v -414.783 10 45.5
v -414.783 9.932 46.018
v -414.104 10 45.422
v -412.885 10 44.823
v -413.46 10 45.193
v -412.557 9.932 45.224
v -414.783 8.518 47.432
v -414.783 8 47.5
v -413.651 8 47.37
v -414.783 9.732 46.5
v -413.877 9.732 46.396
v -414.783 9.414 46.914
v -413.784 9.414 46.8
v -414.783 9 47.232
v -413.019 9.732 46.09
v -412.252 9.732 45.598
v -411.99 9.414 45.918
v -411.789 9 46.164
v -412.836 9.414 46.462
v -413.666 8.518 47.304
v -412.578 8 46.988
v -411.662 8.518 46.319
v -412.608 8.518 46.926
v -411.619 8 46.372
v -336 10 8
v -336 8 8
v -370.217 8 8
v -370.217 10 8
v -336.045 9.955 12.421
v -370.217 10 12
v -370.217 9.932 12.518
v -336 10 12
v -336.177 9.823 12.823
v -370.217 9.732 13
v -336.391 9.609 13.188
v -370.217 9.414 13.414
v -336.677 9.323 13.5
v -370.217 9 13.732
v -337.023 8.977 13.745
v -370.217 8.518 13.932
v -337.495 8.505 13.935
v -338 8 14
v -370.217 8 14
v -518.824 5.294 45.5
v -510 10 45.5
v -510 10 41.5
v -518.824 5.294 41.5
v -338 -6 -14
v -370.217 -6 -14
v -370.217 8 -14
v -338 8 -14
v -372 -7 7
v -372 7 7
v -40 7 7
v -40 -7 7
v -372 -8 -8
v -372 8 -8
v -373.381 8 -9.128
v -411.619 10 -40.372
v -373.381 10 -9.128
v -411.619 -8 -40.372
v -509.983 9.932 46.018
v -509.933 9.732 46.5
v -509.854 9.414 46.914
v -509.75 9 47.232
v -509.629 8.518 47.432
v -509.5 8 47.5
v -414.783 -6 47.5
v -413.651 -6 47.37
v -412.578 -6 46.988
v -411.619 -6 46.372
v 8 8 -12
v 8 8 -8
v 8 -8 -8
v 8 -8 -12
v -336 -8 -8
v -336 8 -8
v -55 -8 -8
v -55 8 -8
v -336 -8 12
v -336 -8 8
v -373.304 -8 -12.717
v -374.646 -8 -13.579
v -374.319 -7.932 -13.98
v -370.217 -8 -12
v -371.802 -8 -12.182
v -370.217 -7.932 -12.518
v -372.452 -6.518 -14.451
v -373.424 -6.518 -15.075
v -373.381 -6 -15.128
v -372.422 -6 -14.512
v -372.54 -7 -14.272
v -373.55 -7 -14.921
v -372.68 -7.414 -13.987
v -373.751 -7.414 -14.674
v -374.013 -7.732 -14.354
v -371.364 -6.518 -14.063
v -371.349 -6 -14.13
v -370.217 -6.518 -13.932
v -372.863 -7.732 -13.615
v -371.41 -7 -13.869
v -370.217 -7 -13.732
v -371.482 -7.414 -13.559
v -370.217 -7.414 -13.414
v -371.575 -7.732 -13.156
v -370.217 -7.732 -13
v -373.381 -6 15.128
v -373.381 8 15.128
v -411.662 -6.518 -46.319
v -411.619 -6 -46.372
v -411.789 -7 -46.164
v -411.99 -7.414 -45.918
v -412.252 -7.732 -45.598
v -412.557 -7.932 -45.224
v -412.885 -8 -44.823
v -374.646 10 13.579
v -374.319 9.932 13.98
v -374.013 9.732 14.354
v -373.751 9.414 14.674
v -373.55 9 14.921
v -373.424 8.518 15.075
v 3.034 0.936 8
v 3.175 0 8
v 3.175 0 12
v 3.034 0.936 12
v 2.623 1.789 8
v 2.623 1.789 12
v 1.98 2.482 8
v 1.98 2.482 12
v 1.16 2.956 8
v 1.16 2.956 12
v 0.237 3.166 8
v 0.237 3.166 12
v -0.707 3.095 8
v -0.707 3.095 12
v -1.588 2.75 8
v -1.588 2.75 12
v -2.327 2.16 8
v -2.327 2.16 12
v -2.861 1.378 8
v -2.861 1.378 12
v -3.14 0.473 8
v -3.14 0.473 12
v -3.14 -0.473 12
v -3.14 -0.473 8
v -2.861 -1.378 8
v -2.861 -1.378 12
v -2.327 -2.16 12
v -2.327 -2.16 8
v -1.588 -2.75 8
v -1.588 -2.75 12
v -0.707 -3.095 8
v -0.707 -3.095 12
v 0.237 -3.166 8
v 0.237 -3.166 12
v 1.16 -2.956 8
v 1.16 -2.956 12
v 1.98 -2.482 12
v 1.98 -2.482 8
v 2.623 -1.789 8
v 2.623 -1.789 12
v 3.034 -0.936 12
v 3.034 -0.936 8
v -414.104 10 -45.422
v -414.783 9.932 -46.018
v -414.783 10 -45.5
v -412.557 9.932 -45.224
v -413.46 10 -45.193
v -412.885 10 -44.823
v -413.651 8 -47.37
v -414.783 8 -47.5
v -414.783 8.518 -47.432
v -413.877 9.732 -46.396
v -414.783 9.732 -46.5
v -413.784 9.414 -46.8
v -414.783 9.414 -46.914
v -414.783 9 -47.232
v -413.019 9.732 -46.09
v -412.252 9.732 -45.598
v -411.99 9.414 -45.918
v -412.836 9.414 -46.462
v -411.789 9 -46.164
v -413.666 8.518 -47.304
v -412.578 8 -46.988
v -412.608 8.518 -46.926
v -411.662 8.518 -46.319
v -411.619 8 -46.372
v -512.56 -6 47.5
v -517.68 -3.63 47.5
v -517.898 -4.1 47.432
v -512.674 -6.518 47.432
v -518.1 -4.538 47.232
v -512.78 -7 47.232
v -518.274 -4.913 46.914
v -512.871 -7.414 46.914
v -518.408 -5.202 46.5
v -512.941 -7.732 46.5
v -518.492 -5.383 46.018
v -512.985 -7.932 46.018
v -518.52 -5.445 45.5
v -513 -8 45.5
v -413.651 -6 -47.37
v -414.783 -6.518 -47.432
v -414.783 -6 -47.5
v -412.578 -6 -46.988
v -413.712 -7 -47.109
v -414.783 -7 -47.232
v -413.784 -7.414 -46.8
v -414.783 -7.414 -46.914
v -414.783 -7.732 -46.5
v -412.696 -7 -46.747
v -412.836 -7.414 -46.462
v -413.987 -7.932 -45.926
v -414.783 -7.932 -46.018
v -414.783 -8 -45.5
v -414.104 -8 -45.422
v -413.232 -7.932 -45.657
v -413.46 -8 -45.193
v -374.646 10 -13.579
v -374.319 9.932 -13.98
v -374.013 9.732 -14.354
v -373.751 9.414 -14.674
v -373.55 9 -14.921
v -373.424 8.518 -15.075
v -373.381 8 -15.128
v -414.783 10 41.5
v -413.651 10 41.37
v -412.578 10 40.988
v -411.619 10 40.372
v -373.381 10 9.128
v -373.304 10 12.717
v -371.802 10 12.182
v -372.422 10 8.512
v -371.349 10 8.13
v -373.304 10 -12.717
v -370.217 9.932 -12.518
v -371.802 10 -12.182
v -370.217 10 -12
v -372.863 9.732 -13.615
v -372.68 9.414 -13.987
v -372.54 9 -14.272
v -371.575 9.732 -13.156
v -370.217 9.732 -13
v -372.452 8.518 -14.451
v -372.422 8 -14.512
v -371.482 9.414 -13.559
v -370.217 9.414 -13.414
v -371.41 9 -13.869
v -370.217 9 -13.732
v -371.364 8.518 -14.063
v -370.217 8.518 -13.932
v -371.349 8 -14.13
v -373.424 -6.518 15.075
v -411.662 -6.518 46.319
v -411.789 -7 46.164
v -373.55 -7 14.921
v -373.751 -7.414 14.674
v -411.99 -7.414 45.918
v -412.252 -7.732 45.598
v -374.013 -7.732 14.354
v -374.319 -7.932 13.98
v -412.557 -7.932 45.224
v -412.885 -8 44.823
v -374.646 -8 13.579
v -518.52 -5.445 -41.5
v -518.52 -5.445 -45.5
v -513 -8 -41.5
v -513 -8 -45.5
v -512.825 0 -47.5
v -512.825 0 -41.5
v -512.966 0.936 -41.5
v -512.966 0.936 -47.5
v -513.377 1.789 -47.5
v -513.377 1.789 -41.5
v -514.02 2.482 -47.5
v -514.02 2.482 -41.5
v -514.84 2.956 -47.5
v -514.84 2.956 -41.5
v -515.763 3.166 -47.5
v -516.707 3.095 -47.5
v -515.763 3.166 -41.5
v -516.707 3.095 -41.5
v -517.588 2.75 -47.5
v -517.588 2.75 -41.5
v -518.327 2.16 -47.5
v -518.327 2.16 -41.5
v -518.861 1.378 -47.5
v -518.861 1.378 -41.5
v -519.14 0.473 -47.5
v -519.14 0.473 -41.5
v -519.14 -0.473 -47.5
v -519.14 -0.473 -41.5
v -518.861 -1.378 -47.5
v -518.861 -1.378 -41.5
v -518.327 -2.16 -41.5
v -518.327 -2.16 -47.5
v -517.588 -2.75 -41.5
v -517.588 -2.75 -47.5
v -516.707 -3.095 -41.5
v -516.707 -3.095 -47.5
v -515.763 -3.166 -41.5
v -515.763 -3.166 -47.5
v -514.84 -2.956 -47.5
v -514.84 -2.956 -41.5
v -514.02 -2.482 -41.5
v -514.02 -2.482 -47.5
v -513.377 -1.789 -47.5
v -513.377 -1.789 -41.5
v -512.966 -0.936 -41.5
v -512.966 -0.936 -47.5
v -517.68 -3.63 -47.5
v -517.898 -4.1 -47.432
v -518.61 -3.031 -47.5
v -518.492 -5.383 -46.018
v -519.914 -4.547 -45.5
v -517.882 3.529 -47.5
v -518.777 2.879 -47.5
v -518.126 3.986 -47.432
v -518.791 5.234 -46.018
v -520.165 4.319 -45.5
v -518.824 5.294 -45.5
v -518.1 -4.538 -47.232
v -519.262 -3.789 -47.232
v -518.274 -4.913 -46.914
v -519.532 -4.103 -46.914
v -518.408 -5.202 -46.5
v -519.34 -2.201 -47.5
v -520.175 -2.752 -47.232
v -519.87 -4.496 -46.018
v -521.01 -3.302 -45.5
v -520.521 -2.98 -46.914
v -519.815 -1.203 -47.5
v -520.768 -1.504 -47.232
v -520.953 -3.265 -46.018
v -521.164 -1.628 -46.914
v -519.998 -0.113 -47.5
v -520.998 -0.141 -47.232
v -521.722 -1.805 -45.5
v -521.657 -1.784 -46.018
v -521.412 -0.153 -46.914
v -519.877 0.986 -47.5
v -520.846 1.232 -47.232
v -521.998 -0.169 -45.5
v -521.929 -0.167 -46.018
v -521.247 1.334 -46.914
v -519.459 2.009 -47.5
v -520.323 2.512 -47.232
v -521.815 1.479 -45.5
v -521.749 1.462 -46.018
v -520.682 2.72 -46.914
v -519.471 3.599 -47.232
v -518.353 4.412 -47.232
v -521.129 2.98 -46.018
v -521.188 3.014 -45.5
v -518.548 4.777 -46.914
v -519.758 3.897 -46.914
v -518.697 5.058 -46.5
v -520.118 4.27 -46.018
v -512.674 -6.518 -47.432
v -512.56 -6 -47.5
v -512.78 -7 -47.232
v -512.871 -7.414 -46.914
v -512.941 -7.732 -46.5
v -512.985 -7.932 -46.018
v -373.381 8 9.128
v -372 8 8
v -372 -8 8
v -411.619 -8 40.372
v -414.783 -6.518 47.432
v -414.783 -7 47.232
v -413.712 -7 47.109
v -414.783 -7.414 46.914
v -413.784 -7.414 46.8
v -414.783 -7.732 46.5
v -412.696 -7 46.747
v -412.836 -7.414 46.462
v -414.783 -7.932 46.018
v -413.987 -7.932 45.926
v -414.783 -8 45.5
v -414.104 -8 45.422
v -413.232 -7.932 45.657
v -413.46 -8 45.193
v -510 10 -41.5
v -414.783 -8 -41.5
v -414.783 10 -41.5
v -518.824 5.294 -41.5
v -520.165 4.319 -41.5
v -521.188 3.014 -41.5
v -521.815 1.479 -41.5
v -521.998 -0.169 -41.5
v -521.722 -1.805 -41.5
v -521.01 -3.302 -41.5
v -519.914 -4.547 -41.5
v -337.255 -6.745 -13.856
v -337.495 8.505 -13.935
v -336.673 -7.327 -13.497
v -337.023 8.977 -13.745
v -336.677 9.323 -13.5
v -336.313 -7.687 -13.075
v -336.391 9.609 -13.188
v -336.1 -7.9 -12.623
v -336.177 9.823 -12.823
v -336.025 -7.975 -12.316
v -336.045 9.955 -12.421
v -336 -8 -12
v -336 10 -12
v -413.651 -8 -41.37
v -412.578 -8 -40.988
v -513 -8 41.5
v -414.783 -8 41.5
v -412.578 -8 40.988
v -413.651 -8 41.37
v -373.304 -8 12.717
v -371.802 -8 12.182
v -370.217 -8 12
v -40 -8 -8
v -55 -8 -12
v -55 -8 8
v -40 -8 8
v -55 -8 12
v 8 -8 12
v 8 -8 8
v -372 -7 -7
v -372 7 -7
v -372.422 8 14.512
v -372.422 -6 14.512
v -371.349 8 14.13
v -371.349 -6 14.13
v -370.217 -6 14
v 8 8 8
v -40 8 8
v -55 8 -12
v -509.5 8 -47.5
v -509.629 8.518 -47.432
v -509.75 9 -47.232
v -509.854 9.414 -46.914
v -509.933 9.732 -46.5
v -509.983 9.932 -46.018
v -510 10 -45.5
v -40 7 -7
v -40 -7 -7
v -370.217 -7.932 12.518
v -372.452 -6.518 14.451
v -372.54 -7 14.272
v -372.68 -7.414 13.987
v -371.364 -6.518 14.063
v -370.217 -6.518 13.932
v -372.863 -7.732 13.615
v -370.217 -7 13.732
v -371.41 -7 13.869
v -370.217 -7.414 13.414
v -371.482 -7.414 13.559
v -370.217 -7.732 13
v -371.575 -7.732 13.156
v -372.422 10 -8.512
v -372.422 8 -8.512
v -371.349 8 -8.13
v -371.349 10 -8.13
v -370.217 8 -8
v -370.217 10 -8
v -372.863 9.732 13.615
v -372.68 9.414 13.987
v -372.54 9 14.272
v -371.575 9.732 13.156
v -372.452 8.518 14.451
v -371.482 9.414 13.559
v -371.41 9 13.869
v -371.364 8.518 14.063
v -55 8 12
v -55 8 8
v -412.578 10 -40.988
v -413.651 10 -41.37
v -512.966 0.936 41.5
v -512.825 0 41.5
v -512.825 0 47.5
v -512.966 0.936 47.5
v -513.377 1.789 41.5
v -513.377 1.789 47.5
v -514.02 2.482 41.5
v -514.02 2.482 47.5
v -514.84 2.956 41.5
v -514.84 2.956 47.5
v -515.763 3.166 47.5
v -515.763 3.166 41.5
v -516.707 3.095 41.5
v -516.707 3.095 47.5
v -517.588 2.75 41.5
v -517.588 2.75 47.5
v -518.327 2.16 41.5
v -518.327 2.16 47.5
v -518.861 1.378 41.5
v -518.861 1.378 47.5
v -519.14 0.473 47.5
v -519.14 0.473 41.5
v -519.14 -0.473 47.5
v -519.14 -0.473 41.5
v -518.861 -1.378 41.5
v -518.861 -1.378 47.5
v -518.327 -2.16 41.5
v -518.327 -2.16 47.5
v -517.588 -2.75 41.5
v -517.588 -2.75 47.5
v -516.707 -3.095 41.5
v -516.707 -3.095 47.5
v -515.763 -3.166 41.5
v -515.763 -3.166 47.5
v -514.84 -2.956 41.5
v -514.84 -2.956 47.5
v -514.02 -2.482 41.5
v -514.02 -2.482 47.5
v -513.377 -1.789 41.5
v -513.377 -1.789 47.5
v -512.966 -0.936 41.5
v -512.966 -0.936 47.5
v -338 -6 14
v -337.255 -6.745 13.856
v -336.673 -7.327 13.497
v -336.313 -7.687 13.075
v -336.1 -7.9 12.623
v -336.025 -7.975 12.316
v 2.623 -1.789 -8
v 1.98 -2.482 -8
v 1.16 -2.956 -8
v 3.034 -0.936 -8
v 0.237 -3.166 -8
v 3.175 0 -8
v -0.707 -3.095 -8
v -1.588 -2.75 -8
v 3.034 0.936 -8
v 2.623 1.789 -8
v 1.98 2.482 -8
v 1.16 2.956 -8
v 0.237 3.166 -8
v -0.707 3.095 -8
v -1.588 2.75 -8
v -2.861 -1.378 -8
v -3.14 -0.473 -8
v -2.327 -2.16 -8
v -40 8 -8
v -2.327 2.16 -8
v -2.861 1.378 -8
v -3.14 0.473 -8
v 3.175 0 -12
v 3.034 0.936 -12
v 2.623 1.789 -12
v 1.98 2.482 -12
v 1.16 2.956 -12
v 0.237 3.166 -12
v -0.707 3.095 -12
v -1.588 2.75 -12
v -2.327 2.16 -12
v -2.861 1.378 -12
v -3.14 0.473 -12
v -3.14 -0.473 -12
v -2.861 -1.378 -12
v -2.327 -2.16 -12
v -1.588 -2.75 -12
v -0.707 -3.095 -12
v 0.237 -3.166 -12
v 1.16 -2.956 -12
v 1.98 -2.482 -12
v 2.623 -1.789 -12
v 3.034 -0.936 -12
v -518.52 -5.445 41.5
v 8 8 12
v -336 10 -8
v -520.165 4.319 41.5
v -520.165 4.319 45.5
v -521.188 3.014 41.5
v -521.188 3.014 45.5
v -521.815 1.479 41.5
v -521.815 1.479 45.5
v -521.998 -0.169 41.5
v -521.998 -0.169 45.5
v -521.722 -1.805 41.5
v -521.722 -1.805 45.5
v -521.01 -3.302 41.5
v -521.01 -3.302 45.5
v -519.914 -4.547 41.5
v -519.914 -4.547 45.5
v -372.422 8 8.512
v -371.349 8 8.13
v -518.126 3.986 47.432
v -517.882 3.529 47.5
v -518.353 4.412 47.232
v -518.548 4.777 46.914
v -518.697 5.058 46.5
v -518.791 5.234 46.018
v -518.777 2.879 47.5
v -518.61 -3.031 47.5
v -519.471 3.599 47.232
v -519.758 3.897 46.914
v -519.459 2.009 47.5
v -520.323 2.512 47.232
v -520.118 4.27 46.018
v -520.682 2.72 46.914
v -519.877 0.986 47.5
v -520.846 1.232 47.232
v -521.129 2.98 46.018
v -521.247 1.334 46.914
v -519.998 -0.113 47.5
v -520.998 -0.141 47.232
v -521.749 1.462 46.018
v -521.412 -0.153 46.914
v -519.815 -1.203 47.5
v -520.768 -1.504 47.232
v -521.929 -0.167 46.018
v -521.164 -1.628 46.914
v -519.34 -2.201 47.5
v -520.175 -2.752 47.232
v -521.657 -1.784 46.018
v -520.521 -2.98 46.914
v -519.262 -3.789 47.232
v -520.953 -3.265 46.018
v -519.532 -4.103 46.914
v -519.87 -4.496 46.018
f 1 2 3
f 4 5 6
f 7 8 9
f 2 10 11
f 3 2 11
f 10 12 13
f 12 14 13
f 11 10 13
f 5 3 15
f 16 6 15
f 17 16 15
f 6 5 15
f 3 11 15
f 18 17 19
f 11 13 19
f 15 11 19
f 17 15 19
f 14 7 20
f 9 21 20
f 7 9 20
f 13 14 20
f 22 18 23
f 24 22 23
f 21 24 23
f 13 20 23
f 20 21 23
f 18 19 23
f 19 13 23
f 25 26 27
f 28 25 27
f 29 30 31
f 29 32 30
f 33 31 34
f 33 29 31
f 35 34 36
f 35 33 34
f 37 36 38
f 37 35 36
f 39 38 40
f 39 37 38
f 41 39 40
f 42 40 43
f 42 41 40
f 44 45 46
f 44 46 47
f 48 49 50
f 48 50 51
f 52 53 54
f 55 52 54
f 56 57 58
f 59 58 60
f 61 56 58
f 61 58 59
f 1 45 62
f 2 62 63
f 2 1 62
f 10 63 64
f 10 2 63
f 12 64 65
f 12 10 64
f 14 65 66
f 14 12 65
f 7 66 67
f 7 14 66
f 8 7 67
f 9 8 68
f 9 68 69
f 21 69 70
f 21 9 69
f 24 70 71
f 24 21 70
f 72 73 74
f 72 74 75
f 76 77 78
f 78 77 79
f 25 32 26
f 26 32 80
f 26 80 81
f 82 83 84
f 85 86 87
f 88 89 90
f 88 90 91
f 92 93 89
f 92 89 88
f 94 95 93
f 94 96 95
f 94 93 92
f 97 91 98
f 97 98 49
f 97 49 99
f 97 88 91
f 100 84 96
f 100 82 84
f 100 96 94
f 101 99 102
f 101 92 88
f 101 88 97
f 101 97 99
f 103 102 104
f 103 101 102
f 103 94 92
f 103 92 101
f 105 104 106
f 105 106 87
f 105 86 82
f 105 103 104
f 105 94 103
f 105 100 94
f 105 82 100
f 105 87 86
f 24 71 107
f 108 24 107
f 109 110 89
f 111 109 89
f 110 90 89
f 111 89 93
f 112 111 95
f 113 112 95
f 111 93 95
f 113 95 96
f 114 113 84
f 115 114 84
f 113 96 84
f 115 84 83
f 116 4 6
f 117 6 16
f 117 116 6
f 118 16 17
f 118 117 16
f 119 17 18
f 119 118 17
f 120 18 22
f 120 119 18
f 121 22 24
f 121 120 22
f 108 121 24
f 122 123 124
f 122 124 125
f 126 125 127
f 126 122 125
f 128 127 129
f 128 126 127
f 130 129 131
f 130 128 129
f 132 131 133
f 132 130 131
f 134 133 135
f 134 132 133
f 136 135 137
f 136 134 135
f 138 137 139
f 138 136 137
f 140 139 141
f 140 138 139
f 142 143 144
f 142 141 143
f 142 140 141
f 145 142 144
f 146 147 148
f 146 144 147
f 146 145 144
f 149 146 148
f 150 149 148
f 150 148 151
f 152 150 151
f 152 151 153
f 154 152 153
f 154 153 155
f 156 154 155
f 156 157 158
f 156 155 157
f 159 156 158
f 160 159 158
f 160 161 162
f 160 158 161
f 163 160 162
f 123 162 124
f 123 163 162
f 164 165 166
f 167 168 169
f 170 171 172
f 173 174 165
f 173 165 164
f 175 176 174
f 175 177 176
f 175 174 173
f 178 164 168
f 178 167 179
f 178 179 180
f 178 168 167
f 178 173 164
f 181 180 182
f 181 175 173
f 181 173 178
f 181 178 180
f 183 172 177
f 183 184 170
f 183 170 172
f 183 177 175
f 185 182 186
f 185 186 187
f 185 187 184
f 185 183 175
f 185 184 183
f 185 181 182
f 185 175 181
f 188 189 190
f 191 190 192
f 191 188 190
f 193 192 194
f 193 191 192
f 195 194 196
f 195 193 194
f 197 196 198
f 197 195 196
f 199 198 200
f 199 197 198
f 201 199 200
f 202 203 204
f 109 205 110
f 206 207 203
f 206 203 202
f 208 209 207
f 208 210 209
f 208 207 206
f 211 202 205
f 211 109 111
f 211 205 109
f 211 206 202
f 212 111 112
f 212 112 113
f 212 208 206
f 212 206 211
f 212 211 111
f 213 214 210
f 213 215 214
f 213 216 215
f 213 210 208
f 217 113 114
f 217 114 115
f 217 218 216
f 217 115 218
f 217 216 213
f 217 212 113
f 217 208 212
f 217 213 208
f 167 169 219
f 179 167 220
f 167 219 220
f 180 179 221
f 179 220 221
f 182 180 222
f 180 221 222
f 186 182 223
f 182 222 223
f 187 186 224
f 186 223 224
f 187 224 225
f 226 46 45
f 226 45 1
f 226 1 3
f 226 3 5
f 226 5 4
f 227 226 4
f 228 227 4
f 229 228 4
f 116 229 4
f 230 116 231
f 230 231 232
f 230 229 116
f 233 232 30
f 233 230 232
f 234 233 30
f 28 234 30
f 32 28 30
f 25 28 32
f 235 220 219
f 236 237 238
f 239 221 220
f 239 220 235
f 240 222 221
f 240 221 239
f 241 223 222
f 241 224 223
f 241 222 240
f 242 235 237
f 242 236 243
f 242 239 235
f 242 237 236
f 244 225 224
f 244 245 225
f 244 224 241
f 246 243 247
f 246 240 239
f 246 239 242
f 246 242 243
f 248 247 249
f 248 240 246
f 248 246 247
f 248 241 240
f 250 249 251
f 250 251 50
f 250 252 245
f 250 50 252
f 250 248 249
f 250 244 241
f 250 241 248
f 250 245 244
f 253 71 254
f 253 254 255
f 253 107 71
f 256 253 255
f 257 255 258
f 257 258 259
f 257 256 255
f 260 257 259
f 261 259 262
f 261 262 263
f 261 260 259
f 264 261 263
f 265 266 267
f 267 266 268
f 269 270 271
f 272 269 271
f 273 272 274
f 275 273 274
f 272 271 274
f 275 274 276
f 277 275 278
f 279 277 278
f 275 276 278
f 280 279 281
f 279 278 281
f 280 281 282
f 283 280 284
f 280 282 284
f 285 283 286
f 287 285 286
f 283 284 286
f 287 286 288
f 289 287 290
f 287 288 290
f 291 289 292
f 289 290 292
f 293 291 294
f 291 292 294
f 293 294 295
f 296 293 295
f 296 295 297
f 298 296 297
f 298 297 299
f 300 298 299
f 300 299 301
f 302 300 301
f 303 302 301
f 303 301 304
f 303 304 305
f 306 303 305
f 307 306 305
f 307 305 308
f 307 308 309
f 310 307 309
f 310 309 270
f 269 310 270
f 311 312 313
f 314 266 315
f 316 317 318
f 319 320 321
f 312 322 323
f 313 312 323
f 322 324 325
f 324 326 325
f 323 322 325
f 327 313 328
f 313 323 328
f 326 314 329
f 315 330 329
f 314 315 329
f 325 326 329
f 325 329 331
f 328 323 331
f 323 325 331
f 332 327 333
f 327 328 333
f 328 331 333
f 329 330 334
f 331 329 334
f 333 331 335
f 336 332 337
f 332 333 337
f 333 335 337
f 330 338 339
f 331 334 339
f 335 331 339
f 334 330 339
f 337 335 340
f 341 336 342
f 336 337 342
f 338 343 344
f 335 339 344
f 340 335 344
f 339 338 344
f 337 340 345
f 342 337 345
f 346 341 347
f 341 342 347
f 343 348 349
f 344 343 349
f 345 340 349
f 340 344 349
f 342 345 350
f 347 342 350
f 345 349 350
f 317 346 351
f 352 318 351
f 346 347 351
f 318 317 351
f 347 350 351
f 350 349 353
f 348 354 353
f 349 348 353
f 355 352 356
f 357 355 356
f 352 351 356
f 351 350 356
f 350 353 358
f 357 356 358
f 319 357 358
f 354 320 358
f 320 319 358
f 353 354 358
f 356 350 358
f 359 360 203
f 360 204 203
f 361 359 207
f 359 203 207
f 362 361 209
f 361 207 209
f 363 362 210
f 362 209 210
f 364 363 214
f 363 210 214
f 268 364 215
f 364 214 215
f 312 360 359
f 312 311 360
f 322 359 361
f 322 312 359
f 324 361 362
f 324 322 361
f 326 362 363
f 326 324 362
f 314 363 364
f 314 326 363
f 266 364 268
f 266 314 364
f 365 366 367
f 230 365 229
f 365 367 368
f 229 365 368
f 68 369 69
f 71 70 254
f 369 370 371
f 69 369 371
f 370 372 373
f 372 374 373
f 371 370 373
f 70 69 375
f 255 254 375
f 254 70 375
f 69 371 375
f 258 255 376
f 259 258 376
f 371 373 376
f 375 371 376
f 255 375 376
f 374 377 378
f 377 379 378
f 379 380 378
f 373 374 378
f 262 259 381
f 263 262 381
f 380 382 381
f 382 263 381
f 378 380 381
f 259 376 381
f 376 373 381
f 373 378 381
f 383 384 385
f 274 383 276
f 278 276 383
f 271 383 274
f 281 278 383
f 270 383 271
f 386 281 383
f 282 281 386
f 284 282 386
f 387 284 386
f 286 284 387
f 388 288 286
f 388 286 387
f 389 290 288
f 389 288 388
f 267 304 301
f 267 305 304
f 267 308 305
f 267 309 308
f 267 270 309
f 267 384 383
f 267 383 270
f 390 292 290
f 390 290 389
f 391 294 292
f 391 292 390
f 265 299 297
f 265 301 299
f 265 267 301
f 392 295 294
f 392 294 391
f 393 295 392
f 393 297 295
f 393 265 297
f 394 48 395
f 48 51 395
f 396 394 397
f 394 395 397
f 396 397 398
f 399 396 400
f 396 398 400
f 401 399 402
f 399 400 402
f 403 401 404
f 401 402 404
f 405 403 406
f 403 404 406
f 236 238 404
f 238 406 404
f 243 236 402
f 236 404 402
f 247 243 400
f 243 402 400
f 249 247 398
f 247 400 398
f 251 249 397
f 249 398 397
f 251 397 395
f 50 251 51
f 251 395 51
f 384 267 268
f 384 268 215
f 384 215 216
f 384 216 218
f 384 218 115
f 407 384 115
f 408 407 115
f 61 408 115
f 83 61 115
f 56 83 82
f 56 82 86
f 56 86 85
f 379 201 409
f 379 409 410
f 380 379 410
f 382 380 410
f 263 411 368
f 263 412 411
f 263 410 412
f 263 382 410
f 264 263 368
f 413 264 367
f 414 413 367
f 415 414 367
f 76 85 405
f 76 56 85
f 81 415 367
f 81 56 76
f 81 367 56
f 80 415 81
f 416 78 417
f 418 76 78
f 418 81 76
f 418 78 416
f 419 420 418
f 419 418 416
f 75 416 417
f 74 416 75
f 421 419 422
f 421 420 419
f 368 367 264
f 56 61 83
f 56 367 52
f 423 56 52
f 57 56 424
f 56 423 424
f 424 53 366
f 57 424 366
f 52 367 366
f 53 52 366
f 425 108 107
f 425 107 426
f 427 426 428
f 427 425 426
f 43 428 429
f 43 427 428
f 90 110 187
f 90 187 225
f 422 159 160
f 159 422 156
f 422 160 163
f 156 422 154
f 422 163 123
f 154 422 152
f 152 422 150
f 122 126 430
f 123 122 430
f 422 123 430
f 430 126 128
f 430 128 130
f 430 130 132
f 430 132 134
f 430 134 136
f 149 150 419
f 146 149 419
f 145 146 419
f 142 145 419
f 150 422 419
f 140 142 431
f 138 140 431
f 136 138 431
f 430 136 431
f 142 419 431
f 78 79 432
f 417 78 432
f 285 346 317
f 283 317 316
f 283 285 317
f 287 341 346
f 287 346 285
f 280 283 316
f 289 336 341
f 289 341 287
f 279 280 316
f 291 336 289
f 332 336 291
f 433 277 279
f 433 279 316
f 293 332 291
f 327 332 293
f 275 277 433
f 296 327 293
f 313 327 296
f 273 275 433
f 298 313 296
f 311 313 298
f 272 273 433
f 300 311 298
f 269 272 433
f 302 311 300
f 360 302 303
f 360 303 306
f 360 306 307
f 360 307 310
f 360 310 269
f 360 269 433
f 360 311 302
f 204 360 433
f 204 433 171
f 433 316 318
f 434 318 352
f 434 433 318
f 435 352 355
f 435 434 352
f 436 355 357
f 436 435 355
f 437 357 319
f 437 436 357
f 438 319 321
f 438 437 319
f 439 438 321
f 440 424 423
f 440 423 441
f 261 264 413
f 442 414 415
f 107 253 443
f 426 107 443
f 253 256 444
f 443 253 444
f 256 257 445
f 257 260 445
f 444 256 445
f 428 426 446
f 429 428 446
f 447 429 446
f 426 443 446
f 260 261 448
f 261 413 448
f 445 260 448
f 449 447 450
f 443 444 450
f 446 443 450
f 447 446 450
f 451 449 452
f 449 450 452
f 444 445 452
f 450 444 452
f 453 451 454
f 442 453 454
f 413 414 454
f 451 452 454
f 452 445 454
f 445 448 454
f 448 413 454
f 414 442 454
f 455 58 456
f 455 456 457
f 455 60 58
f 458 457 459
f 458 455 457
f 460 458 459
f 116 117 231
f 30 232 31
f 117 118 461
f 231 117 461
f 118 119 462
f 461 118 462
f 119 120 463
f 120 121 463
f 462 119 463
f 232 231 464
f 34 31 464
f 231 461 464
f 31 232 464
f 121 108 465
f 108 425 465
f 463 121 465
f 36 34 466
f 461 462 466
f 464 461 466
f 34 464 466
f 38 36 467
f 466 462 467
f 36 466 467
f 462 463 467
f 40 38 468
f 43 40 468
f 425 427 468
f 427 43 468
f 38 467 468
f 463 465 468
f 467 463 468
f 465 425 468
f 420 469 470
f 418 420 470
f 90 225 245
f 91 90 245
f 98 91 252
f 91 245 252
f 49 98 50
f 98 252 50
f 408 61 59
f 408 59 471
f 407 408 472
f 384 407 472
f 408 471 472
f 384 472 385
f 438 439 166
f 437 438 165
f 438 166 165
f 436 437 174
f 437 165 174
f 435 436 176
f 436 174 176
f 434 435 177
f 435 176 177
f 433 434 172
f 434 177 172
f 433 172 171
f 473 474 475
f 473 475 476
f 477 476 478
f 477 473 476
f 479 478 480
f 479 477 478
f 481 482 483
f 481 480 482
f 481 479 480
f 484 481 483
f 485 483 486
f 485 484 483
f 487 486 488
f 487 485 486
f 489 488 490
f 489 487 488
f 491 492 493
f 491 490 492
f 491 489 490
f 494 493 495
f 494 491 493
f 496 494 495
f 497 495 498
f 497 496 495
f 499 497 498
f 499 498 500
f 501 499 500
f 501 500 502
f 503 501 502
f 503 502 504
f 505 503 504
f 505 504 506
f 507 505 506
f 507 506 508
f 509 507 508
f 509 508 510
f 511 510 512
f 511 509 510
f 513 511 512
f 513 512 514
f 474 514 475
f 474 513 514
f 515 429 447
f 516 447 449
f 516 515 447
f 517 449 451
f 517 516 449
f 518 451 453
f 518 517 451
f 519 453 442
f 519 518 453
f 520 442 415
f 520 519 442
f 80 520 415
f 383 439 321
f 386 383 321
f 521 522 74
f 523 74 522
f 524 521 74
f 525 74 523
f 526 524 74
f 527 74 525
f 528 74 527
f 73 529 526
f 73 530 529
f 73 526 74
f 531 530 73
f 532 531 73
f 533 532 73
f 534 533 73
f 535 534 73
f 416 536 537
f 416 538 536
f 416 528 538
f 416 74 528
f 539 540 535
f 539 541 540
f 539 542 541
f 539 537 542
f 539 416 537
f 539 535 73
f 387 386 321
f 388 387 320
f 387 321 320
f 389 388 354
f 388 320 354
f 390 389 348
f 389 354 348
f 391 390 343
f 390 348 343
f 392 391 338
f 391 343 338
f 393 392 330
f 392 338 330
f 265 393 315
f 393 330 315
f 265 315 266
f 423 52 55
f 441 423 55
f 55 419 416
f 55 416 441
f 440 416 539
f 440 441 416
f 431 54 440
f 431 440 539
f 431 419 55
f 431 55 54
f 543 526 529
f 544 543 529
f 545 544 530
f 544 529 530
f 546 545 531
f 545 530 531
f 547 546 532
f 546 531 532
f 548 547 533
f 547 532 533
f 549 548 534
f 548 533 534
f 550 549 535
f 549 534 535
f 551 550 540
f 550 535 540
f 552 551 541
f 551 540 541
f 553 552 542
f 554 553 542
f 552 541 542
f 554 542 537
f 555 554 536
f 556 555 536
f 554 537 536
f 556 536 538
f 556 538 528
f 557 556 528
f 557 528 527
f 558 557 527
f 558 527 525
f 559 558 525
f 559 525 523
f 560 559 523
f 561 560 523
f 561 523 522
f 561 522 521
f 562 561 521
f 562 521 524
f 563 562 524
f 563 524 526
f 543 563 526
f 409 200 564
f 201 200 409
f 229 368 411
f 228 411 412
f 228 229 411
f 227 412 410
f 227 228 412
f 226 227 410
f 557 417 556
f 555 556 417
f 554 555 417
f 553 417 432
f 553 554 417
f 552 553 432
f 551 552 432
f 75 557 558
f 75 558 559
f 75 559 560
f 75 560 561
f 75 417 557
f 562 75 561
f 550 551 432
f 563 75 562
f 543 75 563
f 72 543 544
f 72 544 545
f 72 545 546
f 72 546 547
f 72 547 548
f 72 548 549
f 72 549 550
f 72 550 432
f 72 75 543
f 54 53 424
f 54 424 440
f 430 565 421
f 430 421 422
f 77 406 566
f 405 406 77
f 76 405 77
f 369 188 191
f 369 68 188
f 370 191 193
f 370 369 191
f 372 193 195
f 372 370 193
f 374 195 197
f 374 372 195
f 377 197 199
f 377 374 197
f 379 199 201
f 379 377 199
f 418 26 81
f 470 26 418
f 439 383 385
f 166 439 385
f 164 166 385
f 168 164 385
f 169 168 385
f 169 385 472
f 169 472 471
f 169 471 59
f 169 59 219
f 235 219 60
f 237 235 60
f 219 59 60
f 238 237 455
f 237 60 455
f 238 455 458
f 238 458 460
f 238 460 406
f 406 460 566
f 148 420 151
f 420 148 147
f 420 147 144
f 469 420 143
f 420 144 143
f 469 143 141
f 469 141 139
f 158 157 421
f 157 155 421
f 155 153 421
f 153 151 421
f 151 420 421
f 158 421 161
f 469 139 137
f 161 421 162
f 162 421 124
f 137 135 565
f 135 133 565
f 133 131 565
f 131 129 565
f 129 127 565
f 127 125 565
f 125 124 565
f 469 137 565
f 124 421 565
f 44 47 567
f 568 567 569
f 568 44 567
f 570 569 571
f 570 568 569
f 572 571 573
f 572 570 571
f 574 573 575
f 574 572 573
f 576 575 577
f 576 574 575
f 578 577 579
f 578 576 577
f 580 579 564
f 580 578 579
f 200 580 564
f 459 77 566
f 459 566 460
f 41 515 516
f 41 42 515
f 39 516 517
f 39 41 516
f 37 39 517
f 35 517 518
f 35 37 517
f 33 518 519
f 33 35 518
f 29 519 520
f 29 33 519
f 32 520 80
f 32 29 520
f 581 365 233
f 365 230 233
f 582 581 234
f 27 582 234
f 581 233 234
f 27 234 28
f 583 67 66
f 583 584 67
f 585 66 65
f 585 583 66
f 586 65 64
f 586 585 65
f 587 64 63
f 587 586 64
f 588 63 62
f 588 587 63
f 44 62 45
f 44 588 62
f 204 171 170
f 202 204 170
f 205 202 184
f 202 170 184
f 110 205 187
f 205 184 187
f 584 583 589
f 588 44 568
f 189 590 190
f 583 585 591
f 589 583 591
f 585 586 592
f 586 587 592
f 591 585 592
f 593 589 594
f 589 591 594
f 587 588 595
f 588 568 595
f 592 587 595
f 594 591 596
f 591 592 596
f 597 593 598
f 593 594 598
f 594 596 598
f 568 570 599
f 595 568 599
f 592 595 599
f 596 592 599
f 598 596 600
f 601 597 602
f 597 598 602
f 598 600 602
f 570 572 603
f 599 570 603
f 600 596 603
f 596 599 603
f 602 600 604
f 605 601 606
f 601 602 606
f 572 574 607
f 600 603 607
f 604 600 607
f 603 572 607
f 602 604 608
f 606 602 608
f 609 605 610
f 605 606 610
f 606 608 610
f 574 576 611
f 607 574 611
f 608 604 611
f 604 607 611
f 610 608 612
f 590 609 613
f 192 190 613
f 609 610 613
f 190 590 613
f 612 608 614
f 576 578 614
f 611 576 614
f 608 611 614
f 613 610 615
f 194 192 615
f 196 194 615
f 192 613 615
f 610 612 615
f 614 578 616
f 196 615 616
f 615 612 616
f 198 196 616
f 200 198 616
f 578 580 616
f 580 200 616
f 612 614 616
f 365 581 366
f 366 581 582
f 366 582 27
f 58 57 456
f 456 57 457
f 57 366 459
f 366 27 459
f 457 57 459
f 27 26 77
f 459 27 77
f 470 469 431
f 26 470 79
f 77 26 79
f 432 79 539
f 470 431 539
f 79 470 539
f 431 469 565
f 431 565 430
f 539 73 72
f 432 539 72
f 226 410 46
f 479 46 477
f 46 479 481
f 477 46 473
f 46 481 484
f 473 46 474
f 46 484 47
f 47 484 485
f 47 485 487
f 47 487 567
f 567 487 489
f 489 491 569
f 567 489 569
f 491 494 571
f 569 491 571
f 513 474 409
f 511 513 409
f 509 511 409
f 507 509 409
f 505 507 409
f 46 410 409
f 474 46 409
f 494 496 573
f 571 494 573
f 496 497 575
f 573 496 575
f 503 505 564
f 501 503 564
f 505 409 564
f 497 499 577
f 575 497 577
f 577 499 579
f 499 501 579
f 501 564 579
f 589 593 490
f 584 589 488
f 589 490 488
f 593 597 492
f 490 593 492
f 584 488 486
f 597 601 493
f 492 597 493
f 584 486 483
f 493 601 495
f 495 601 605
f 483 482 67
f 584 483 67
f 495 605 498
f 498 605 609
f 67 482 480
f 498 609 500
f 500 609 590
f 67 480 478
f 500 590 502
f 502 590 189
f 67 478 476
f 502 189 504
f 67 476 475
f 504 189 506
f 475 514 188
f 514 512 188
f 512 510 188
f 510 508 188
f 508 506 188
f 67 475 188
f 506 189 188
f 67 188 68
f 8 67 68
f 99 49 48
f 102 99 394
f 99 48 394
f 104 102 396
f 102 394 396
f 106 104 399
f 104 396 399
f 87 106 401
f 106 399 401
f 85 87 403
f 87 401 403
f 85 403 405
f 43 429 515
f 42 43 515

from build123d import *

# Parameters (mm, degrees)
SKETCH1_W                = 332
SKETCH1_H                = 16
BOSS_EXTRUDE1_DEPTH      = 8
SHELL1_T                 = -1
SKETCH2_W                = 4
SKETCH2_H                = 16
BOSS_EXTRUDE2_DEPTH      = 48
BOSS_EXTRUDE2_DEPTH_BACK = 15
BOSS_EXTRUDE3_START      = -16
BOSS_EXTRUDE3_DEPTH      = 18
CUT_EXTRUDE1_DEPTH       = 40
FILLET1_R                = 5
FILLET2_R                = 2
FILLET1_OF_MIRROR1_R     = 5
FILLET2_OF_MIRROR1_R     = 2
SKETCH1_3_R              = 3.175
CUT_EXTRUDE2_DEPTH       = 48.5
CUT_EXTRUDE2_DEPTH_BACK  = 48.5


with BuildPart() as part:
    # Sketch1 → Boss-Extrude1 (new body, symmetric)
    with BuildSketch(Plane.XY):
        with Locations((-206, 0)):
            Rectangle(SKETCH1_W, SKETCH1_H)
    extrude(amount=BOSS_EXTRUDE1_DEPTH, both=True)

    # Shell1
    shell1_openings = [part.faces().sort_by_distance(p)[0] for p in [
        (-40, 0, 0),
        (-372, 0, 0),
    ]]
    offset(amount=SHELL1_T, openings=shell1_openings, kind=Kind.INTERSECTION)

    # Sketch2 → Boss-Extrude2 (add, two sides)
    with BuildSketch(Plane(origin=(-40, 0, 0), x_dir=(0, 0, -1), z_dir=(1, 0, 0))) as boss_extrude2_sk:
        with Locations((-10, 0)):
            Rectangle(SKETCH2_W, SKETCH2_H)
        with Locations((10, 0)):
            Rectangle(SKETCH2_W, SKETCH2_H)
    extrude(amount=BOSS_EXTRUDE2_DEPTH)
    extrude(boss_extrude2_sk.sketch, amount=-BOSS_EXTRUDE2_DEPTH_BACK)

    # Sketch3 → Boss-Extrude3 (add)
    with BuildSketch(Plane(origin=(0, 8, 0), x_dir=(1, 0, 0), z_dir=(0, 1, 0)).offset(BOSS_EXTRUDE3_START)):
        Polygon((-336, -14), (-336, -8), (-372, -8), (-413, -41.5), (-522, -41.5), (-522, -47.5), (-413, -47.5), (-372, -14), align=None)
    boss_extrude3 = extrude(amount=BOSS_EXTRUDE3_DEPTH)

    # Sketch4 → Cut-Extrude1 (cut)
    with BuildSketch(Plane.XY.offset(47.5)):
        with BuildLine():
            Line((-510, 10), (-518.823529412, 5.294117647))
            ThreePointArc((-518.823529412, 5.294117647), (-521.99760764, -0.169418391), (-518.520172623, -5.445064733))
            Line((-518.520172623, -5.445064733), (-513, -8))
            Line((-513, -8), (-540.277730866, -26.369352849))
            Line((-540.277730866, -26.369352849), (-542.314823198, 28.070412495))
            Line((-542.314823198, 28.070412495), (-510, 10))
        make_face()
    cut_extrude1 = extrude(amount=-CUT_EXTRUDE1_DEPTH, mode=Mode.SUBTRACT)

    # Fillet1
    fillet1_edges = [part.edges().sort_by_distance(p)[0] for p in [
        (-413, 1, 41.5),
        (-413, 1, 47.5),
        (-372, 1, 14),
        (-372, 9, 8),
    ]]
    fillet(fillet1_edges, radius=FILLET1_R)

    # Fillet2
    fillet2_edges = [part.edges().sort_by_distance(p)[0] for p in [
        (-462.391472159, 10, 47.5),
        (-392.5, 10, 30.75),
        (-413.103576447, 10, 47.209535386),
        (-353.108527841, -8, 14),
        (-392.5, -8, 30.75),
        (-413.103576447, -8, 47.209535386),
        (-371.896423553, -8, 14.290464614),
        (-371.896423553, 10, 14.290464614),
        (-353.108527841, 10, 14),
        (-336, 1, 14),
        (-463.891472159, -8, 47.5),
        (-521.99760764, -0.169418391, 47.5),
        (-514.411764706, 7.647058824, 47.5),
        (-515.760086311, -6.722532367, 47.5),
    ]]
    fillet(fillet2_edges, radius=FILLET2_R)

    # Mirror1: Boss-Extrude3, Cut-Extrude1 across plane
    add(boss_extrude3.mirror(Plane.XY))
    add(cut_extrude1.mirror(Plane.XY), mode=Mode.SUBTRACT)

    # Fillet1 of Mirror1
    fillet1_of_mirror1_edges = [part.edges().sort_by_distance(p)[0] for p in [
        (-413, 1, -41.5),
        (-413, 1, -47.5),
        (-372, 1, -14),
        (-372, 9, -8),
    ]]
    fillet(fillet1_of_mirror1_edges, radius=FILLET1_OF_MIRROR1_R)

    # Fillet2 of Mirror1
    fillet2_of_mirror1_edges = [part.edges().sort_by_distance(p)[0] for p in [
        (-462.391472159, 10, -47.5),
        (-392.5, 10, -30.75),
        (-413.103576447, 10, -47.209535386),
        (-353.108527841, -8, -14),
        (-392.5, -8, -30.75),
        (-413.103576447, -8, -47.209535386),
        (-371.896423553, -8, -14.290464614),
        (-371.896423553, 10, -14.290464614),
        (-353.108527841, 10, -14),
        (-336, 1, -14),
        (-463.891472159, -8, -47.5),
        (-521.99760764, -0.169418391, -47.5),
        (-514.411764706, 7.647058824, -47.5),
        (-515.760086311, -6.722532367, -47.5),
    ]]
    fillet(fillet2_of_mirror1_edges, radius=FILLET2_OF_MIRROR1_R)

    # Sketch1<3> → Cut-Extrude2 (cut, two sides)
    with BuildSketch(Plane.XY) as cut_extrude2_sk:
        with Locations((-516, 0)):
            Circle(SKETCH1_3_R)
        Circle(SKETCH1_3_R)
    extrude(amount=CUT_EXTRUDE2_DEPTH, mode=Mode.SUBTRACT)
    extrude(cut_extrude2_sk.sketch, amount=-CUT_EXTRUDE2_DEPTH_BACK, mode=Mode.SUBTRACT)


solid = part.part
